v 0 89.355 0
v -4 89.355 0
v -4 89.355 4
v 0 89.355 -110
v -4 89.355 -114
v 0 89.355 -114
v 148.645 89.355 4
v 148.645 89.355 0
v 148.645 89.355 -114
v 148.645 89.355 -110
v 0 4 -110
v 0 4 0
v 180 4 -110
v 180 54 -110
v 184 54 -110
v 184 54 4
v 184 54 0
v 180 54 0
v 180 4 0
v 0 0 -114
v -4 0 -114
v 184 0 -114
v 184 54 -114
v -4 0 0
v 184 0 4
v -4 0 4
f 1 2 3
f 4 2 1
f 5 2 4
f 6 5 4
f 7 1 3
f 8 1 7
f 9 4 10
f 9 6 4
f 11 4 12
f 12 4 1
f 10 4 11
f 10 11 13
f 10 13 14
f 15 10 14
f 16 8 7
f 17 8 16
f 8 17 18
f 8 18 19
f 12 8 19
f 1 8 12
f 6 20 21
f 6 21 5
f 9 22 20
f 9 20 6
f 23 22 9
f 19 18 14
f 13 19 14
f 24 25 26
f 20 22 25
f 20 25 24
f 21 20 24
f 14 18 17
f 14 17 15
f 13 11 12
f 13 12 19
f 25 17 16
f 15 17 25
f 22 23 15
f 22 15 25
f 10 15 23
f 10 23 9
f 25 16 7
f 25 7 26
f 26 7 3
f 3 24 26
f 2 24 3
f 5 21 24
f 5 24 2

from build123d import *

# Parameters (mm, degrees)
SKETCH1_W           = 180
SKETCH1_H           = 110
BOSS_EXTRUDE1_DEPTH = 4
SKETCH3_W           = 110
SKETCH3_H           = 54
BOSS_EXTRUDE2_DEPTH = 4
BOSS_EXTRUDE3_DEPTH = 4
SKETCH5_W           = 114
SKETCH5_H           = 89.355339059
BOSS_EXTRUDE4_DEPTH = 4
BOSS_EXTRUDE5_DEPTH = 4


with BuildPart() as part:
    # Sketch1 → Boss-Extrude1 (new body)
    with BuildSketch(Plane(origin=(0, 0, 0), x_dir=(1, 0, 0), z_dir=(0, 1, 0))):
        with Locations((90, 55)):
            Rectangle(SKETCH1_W, SKETCH1_H)
    extrude(amount=BOSS_EXTRUDE1_DEPTH)

    # Sketch3 → Boss-Extrude2 (add)
    with BuildSketch(Plane(origin=(180, 0, 0), x_dir=(0, 0, -1), z_dir=(1, 0, 0))):
        with Locations((55, 27)):
            Rectangle(SKETCH3_W, SKETCH3_H)
    extrude(amount=BOSS_EXTRUDE2_DEPTH)

    # Sketch4 → Boss-Extrude3 (add)
    with BuildSketch(Plane(origin=(0, 0, -110), x_dir=(-1, 0, 0), z_dir=(0, 0, -1))):
        Polygon((-184, 54), (-148.644660941, 89.355339059), (0, 89.355339059), (0, 4), (0, 0), (-184, 0), align=None)
    extrude(amount=BOSS_EXTRUDE3_DEPTH)

    # Sketch5 → Boss-Extrude4 (add)
    with BuildSketch(Plane.ZY):
        with Locations((-57, 44.67766953)):
            Rectangle(SKETCH5_W, SKETCH5_H)
    extrude(amount=BOSS_EXTRUDE4_DEPTH)

    # Sketch10 → Boss-Extrude5 (add)
    with BuildSketch(Plane.XY):
        Polygon((-4, 89.355339059), (148.644660941, 89.355339059), (184, 54), (184, 0), (-4, 0), align=None)
    extrude(amount=BOSS_EXTRUDE5_DEPTH)


solid = part.part
